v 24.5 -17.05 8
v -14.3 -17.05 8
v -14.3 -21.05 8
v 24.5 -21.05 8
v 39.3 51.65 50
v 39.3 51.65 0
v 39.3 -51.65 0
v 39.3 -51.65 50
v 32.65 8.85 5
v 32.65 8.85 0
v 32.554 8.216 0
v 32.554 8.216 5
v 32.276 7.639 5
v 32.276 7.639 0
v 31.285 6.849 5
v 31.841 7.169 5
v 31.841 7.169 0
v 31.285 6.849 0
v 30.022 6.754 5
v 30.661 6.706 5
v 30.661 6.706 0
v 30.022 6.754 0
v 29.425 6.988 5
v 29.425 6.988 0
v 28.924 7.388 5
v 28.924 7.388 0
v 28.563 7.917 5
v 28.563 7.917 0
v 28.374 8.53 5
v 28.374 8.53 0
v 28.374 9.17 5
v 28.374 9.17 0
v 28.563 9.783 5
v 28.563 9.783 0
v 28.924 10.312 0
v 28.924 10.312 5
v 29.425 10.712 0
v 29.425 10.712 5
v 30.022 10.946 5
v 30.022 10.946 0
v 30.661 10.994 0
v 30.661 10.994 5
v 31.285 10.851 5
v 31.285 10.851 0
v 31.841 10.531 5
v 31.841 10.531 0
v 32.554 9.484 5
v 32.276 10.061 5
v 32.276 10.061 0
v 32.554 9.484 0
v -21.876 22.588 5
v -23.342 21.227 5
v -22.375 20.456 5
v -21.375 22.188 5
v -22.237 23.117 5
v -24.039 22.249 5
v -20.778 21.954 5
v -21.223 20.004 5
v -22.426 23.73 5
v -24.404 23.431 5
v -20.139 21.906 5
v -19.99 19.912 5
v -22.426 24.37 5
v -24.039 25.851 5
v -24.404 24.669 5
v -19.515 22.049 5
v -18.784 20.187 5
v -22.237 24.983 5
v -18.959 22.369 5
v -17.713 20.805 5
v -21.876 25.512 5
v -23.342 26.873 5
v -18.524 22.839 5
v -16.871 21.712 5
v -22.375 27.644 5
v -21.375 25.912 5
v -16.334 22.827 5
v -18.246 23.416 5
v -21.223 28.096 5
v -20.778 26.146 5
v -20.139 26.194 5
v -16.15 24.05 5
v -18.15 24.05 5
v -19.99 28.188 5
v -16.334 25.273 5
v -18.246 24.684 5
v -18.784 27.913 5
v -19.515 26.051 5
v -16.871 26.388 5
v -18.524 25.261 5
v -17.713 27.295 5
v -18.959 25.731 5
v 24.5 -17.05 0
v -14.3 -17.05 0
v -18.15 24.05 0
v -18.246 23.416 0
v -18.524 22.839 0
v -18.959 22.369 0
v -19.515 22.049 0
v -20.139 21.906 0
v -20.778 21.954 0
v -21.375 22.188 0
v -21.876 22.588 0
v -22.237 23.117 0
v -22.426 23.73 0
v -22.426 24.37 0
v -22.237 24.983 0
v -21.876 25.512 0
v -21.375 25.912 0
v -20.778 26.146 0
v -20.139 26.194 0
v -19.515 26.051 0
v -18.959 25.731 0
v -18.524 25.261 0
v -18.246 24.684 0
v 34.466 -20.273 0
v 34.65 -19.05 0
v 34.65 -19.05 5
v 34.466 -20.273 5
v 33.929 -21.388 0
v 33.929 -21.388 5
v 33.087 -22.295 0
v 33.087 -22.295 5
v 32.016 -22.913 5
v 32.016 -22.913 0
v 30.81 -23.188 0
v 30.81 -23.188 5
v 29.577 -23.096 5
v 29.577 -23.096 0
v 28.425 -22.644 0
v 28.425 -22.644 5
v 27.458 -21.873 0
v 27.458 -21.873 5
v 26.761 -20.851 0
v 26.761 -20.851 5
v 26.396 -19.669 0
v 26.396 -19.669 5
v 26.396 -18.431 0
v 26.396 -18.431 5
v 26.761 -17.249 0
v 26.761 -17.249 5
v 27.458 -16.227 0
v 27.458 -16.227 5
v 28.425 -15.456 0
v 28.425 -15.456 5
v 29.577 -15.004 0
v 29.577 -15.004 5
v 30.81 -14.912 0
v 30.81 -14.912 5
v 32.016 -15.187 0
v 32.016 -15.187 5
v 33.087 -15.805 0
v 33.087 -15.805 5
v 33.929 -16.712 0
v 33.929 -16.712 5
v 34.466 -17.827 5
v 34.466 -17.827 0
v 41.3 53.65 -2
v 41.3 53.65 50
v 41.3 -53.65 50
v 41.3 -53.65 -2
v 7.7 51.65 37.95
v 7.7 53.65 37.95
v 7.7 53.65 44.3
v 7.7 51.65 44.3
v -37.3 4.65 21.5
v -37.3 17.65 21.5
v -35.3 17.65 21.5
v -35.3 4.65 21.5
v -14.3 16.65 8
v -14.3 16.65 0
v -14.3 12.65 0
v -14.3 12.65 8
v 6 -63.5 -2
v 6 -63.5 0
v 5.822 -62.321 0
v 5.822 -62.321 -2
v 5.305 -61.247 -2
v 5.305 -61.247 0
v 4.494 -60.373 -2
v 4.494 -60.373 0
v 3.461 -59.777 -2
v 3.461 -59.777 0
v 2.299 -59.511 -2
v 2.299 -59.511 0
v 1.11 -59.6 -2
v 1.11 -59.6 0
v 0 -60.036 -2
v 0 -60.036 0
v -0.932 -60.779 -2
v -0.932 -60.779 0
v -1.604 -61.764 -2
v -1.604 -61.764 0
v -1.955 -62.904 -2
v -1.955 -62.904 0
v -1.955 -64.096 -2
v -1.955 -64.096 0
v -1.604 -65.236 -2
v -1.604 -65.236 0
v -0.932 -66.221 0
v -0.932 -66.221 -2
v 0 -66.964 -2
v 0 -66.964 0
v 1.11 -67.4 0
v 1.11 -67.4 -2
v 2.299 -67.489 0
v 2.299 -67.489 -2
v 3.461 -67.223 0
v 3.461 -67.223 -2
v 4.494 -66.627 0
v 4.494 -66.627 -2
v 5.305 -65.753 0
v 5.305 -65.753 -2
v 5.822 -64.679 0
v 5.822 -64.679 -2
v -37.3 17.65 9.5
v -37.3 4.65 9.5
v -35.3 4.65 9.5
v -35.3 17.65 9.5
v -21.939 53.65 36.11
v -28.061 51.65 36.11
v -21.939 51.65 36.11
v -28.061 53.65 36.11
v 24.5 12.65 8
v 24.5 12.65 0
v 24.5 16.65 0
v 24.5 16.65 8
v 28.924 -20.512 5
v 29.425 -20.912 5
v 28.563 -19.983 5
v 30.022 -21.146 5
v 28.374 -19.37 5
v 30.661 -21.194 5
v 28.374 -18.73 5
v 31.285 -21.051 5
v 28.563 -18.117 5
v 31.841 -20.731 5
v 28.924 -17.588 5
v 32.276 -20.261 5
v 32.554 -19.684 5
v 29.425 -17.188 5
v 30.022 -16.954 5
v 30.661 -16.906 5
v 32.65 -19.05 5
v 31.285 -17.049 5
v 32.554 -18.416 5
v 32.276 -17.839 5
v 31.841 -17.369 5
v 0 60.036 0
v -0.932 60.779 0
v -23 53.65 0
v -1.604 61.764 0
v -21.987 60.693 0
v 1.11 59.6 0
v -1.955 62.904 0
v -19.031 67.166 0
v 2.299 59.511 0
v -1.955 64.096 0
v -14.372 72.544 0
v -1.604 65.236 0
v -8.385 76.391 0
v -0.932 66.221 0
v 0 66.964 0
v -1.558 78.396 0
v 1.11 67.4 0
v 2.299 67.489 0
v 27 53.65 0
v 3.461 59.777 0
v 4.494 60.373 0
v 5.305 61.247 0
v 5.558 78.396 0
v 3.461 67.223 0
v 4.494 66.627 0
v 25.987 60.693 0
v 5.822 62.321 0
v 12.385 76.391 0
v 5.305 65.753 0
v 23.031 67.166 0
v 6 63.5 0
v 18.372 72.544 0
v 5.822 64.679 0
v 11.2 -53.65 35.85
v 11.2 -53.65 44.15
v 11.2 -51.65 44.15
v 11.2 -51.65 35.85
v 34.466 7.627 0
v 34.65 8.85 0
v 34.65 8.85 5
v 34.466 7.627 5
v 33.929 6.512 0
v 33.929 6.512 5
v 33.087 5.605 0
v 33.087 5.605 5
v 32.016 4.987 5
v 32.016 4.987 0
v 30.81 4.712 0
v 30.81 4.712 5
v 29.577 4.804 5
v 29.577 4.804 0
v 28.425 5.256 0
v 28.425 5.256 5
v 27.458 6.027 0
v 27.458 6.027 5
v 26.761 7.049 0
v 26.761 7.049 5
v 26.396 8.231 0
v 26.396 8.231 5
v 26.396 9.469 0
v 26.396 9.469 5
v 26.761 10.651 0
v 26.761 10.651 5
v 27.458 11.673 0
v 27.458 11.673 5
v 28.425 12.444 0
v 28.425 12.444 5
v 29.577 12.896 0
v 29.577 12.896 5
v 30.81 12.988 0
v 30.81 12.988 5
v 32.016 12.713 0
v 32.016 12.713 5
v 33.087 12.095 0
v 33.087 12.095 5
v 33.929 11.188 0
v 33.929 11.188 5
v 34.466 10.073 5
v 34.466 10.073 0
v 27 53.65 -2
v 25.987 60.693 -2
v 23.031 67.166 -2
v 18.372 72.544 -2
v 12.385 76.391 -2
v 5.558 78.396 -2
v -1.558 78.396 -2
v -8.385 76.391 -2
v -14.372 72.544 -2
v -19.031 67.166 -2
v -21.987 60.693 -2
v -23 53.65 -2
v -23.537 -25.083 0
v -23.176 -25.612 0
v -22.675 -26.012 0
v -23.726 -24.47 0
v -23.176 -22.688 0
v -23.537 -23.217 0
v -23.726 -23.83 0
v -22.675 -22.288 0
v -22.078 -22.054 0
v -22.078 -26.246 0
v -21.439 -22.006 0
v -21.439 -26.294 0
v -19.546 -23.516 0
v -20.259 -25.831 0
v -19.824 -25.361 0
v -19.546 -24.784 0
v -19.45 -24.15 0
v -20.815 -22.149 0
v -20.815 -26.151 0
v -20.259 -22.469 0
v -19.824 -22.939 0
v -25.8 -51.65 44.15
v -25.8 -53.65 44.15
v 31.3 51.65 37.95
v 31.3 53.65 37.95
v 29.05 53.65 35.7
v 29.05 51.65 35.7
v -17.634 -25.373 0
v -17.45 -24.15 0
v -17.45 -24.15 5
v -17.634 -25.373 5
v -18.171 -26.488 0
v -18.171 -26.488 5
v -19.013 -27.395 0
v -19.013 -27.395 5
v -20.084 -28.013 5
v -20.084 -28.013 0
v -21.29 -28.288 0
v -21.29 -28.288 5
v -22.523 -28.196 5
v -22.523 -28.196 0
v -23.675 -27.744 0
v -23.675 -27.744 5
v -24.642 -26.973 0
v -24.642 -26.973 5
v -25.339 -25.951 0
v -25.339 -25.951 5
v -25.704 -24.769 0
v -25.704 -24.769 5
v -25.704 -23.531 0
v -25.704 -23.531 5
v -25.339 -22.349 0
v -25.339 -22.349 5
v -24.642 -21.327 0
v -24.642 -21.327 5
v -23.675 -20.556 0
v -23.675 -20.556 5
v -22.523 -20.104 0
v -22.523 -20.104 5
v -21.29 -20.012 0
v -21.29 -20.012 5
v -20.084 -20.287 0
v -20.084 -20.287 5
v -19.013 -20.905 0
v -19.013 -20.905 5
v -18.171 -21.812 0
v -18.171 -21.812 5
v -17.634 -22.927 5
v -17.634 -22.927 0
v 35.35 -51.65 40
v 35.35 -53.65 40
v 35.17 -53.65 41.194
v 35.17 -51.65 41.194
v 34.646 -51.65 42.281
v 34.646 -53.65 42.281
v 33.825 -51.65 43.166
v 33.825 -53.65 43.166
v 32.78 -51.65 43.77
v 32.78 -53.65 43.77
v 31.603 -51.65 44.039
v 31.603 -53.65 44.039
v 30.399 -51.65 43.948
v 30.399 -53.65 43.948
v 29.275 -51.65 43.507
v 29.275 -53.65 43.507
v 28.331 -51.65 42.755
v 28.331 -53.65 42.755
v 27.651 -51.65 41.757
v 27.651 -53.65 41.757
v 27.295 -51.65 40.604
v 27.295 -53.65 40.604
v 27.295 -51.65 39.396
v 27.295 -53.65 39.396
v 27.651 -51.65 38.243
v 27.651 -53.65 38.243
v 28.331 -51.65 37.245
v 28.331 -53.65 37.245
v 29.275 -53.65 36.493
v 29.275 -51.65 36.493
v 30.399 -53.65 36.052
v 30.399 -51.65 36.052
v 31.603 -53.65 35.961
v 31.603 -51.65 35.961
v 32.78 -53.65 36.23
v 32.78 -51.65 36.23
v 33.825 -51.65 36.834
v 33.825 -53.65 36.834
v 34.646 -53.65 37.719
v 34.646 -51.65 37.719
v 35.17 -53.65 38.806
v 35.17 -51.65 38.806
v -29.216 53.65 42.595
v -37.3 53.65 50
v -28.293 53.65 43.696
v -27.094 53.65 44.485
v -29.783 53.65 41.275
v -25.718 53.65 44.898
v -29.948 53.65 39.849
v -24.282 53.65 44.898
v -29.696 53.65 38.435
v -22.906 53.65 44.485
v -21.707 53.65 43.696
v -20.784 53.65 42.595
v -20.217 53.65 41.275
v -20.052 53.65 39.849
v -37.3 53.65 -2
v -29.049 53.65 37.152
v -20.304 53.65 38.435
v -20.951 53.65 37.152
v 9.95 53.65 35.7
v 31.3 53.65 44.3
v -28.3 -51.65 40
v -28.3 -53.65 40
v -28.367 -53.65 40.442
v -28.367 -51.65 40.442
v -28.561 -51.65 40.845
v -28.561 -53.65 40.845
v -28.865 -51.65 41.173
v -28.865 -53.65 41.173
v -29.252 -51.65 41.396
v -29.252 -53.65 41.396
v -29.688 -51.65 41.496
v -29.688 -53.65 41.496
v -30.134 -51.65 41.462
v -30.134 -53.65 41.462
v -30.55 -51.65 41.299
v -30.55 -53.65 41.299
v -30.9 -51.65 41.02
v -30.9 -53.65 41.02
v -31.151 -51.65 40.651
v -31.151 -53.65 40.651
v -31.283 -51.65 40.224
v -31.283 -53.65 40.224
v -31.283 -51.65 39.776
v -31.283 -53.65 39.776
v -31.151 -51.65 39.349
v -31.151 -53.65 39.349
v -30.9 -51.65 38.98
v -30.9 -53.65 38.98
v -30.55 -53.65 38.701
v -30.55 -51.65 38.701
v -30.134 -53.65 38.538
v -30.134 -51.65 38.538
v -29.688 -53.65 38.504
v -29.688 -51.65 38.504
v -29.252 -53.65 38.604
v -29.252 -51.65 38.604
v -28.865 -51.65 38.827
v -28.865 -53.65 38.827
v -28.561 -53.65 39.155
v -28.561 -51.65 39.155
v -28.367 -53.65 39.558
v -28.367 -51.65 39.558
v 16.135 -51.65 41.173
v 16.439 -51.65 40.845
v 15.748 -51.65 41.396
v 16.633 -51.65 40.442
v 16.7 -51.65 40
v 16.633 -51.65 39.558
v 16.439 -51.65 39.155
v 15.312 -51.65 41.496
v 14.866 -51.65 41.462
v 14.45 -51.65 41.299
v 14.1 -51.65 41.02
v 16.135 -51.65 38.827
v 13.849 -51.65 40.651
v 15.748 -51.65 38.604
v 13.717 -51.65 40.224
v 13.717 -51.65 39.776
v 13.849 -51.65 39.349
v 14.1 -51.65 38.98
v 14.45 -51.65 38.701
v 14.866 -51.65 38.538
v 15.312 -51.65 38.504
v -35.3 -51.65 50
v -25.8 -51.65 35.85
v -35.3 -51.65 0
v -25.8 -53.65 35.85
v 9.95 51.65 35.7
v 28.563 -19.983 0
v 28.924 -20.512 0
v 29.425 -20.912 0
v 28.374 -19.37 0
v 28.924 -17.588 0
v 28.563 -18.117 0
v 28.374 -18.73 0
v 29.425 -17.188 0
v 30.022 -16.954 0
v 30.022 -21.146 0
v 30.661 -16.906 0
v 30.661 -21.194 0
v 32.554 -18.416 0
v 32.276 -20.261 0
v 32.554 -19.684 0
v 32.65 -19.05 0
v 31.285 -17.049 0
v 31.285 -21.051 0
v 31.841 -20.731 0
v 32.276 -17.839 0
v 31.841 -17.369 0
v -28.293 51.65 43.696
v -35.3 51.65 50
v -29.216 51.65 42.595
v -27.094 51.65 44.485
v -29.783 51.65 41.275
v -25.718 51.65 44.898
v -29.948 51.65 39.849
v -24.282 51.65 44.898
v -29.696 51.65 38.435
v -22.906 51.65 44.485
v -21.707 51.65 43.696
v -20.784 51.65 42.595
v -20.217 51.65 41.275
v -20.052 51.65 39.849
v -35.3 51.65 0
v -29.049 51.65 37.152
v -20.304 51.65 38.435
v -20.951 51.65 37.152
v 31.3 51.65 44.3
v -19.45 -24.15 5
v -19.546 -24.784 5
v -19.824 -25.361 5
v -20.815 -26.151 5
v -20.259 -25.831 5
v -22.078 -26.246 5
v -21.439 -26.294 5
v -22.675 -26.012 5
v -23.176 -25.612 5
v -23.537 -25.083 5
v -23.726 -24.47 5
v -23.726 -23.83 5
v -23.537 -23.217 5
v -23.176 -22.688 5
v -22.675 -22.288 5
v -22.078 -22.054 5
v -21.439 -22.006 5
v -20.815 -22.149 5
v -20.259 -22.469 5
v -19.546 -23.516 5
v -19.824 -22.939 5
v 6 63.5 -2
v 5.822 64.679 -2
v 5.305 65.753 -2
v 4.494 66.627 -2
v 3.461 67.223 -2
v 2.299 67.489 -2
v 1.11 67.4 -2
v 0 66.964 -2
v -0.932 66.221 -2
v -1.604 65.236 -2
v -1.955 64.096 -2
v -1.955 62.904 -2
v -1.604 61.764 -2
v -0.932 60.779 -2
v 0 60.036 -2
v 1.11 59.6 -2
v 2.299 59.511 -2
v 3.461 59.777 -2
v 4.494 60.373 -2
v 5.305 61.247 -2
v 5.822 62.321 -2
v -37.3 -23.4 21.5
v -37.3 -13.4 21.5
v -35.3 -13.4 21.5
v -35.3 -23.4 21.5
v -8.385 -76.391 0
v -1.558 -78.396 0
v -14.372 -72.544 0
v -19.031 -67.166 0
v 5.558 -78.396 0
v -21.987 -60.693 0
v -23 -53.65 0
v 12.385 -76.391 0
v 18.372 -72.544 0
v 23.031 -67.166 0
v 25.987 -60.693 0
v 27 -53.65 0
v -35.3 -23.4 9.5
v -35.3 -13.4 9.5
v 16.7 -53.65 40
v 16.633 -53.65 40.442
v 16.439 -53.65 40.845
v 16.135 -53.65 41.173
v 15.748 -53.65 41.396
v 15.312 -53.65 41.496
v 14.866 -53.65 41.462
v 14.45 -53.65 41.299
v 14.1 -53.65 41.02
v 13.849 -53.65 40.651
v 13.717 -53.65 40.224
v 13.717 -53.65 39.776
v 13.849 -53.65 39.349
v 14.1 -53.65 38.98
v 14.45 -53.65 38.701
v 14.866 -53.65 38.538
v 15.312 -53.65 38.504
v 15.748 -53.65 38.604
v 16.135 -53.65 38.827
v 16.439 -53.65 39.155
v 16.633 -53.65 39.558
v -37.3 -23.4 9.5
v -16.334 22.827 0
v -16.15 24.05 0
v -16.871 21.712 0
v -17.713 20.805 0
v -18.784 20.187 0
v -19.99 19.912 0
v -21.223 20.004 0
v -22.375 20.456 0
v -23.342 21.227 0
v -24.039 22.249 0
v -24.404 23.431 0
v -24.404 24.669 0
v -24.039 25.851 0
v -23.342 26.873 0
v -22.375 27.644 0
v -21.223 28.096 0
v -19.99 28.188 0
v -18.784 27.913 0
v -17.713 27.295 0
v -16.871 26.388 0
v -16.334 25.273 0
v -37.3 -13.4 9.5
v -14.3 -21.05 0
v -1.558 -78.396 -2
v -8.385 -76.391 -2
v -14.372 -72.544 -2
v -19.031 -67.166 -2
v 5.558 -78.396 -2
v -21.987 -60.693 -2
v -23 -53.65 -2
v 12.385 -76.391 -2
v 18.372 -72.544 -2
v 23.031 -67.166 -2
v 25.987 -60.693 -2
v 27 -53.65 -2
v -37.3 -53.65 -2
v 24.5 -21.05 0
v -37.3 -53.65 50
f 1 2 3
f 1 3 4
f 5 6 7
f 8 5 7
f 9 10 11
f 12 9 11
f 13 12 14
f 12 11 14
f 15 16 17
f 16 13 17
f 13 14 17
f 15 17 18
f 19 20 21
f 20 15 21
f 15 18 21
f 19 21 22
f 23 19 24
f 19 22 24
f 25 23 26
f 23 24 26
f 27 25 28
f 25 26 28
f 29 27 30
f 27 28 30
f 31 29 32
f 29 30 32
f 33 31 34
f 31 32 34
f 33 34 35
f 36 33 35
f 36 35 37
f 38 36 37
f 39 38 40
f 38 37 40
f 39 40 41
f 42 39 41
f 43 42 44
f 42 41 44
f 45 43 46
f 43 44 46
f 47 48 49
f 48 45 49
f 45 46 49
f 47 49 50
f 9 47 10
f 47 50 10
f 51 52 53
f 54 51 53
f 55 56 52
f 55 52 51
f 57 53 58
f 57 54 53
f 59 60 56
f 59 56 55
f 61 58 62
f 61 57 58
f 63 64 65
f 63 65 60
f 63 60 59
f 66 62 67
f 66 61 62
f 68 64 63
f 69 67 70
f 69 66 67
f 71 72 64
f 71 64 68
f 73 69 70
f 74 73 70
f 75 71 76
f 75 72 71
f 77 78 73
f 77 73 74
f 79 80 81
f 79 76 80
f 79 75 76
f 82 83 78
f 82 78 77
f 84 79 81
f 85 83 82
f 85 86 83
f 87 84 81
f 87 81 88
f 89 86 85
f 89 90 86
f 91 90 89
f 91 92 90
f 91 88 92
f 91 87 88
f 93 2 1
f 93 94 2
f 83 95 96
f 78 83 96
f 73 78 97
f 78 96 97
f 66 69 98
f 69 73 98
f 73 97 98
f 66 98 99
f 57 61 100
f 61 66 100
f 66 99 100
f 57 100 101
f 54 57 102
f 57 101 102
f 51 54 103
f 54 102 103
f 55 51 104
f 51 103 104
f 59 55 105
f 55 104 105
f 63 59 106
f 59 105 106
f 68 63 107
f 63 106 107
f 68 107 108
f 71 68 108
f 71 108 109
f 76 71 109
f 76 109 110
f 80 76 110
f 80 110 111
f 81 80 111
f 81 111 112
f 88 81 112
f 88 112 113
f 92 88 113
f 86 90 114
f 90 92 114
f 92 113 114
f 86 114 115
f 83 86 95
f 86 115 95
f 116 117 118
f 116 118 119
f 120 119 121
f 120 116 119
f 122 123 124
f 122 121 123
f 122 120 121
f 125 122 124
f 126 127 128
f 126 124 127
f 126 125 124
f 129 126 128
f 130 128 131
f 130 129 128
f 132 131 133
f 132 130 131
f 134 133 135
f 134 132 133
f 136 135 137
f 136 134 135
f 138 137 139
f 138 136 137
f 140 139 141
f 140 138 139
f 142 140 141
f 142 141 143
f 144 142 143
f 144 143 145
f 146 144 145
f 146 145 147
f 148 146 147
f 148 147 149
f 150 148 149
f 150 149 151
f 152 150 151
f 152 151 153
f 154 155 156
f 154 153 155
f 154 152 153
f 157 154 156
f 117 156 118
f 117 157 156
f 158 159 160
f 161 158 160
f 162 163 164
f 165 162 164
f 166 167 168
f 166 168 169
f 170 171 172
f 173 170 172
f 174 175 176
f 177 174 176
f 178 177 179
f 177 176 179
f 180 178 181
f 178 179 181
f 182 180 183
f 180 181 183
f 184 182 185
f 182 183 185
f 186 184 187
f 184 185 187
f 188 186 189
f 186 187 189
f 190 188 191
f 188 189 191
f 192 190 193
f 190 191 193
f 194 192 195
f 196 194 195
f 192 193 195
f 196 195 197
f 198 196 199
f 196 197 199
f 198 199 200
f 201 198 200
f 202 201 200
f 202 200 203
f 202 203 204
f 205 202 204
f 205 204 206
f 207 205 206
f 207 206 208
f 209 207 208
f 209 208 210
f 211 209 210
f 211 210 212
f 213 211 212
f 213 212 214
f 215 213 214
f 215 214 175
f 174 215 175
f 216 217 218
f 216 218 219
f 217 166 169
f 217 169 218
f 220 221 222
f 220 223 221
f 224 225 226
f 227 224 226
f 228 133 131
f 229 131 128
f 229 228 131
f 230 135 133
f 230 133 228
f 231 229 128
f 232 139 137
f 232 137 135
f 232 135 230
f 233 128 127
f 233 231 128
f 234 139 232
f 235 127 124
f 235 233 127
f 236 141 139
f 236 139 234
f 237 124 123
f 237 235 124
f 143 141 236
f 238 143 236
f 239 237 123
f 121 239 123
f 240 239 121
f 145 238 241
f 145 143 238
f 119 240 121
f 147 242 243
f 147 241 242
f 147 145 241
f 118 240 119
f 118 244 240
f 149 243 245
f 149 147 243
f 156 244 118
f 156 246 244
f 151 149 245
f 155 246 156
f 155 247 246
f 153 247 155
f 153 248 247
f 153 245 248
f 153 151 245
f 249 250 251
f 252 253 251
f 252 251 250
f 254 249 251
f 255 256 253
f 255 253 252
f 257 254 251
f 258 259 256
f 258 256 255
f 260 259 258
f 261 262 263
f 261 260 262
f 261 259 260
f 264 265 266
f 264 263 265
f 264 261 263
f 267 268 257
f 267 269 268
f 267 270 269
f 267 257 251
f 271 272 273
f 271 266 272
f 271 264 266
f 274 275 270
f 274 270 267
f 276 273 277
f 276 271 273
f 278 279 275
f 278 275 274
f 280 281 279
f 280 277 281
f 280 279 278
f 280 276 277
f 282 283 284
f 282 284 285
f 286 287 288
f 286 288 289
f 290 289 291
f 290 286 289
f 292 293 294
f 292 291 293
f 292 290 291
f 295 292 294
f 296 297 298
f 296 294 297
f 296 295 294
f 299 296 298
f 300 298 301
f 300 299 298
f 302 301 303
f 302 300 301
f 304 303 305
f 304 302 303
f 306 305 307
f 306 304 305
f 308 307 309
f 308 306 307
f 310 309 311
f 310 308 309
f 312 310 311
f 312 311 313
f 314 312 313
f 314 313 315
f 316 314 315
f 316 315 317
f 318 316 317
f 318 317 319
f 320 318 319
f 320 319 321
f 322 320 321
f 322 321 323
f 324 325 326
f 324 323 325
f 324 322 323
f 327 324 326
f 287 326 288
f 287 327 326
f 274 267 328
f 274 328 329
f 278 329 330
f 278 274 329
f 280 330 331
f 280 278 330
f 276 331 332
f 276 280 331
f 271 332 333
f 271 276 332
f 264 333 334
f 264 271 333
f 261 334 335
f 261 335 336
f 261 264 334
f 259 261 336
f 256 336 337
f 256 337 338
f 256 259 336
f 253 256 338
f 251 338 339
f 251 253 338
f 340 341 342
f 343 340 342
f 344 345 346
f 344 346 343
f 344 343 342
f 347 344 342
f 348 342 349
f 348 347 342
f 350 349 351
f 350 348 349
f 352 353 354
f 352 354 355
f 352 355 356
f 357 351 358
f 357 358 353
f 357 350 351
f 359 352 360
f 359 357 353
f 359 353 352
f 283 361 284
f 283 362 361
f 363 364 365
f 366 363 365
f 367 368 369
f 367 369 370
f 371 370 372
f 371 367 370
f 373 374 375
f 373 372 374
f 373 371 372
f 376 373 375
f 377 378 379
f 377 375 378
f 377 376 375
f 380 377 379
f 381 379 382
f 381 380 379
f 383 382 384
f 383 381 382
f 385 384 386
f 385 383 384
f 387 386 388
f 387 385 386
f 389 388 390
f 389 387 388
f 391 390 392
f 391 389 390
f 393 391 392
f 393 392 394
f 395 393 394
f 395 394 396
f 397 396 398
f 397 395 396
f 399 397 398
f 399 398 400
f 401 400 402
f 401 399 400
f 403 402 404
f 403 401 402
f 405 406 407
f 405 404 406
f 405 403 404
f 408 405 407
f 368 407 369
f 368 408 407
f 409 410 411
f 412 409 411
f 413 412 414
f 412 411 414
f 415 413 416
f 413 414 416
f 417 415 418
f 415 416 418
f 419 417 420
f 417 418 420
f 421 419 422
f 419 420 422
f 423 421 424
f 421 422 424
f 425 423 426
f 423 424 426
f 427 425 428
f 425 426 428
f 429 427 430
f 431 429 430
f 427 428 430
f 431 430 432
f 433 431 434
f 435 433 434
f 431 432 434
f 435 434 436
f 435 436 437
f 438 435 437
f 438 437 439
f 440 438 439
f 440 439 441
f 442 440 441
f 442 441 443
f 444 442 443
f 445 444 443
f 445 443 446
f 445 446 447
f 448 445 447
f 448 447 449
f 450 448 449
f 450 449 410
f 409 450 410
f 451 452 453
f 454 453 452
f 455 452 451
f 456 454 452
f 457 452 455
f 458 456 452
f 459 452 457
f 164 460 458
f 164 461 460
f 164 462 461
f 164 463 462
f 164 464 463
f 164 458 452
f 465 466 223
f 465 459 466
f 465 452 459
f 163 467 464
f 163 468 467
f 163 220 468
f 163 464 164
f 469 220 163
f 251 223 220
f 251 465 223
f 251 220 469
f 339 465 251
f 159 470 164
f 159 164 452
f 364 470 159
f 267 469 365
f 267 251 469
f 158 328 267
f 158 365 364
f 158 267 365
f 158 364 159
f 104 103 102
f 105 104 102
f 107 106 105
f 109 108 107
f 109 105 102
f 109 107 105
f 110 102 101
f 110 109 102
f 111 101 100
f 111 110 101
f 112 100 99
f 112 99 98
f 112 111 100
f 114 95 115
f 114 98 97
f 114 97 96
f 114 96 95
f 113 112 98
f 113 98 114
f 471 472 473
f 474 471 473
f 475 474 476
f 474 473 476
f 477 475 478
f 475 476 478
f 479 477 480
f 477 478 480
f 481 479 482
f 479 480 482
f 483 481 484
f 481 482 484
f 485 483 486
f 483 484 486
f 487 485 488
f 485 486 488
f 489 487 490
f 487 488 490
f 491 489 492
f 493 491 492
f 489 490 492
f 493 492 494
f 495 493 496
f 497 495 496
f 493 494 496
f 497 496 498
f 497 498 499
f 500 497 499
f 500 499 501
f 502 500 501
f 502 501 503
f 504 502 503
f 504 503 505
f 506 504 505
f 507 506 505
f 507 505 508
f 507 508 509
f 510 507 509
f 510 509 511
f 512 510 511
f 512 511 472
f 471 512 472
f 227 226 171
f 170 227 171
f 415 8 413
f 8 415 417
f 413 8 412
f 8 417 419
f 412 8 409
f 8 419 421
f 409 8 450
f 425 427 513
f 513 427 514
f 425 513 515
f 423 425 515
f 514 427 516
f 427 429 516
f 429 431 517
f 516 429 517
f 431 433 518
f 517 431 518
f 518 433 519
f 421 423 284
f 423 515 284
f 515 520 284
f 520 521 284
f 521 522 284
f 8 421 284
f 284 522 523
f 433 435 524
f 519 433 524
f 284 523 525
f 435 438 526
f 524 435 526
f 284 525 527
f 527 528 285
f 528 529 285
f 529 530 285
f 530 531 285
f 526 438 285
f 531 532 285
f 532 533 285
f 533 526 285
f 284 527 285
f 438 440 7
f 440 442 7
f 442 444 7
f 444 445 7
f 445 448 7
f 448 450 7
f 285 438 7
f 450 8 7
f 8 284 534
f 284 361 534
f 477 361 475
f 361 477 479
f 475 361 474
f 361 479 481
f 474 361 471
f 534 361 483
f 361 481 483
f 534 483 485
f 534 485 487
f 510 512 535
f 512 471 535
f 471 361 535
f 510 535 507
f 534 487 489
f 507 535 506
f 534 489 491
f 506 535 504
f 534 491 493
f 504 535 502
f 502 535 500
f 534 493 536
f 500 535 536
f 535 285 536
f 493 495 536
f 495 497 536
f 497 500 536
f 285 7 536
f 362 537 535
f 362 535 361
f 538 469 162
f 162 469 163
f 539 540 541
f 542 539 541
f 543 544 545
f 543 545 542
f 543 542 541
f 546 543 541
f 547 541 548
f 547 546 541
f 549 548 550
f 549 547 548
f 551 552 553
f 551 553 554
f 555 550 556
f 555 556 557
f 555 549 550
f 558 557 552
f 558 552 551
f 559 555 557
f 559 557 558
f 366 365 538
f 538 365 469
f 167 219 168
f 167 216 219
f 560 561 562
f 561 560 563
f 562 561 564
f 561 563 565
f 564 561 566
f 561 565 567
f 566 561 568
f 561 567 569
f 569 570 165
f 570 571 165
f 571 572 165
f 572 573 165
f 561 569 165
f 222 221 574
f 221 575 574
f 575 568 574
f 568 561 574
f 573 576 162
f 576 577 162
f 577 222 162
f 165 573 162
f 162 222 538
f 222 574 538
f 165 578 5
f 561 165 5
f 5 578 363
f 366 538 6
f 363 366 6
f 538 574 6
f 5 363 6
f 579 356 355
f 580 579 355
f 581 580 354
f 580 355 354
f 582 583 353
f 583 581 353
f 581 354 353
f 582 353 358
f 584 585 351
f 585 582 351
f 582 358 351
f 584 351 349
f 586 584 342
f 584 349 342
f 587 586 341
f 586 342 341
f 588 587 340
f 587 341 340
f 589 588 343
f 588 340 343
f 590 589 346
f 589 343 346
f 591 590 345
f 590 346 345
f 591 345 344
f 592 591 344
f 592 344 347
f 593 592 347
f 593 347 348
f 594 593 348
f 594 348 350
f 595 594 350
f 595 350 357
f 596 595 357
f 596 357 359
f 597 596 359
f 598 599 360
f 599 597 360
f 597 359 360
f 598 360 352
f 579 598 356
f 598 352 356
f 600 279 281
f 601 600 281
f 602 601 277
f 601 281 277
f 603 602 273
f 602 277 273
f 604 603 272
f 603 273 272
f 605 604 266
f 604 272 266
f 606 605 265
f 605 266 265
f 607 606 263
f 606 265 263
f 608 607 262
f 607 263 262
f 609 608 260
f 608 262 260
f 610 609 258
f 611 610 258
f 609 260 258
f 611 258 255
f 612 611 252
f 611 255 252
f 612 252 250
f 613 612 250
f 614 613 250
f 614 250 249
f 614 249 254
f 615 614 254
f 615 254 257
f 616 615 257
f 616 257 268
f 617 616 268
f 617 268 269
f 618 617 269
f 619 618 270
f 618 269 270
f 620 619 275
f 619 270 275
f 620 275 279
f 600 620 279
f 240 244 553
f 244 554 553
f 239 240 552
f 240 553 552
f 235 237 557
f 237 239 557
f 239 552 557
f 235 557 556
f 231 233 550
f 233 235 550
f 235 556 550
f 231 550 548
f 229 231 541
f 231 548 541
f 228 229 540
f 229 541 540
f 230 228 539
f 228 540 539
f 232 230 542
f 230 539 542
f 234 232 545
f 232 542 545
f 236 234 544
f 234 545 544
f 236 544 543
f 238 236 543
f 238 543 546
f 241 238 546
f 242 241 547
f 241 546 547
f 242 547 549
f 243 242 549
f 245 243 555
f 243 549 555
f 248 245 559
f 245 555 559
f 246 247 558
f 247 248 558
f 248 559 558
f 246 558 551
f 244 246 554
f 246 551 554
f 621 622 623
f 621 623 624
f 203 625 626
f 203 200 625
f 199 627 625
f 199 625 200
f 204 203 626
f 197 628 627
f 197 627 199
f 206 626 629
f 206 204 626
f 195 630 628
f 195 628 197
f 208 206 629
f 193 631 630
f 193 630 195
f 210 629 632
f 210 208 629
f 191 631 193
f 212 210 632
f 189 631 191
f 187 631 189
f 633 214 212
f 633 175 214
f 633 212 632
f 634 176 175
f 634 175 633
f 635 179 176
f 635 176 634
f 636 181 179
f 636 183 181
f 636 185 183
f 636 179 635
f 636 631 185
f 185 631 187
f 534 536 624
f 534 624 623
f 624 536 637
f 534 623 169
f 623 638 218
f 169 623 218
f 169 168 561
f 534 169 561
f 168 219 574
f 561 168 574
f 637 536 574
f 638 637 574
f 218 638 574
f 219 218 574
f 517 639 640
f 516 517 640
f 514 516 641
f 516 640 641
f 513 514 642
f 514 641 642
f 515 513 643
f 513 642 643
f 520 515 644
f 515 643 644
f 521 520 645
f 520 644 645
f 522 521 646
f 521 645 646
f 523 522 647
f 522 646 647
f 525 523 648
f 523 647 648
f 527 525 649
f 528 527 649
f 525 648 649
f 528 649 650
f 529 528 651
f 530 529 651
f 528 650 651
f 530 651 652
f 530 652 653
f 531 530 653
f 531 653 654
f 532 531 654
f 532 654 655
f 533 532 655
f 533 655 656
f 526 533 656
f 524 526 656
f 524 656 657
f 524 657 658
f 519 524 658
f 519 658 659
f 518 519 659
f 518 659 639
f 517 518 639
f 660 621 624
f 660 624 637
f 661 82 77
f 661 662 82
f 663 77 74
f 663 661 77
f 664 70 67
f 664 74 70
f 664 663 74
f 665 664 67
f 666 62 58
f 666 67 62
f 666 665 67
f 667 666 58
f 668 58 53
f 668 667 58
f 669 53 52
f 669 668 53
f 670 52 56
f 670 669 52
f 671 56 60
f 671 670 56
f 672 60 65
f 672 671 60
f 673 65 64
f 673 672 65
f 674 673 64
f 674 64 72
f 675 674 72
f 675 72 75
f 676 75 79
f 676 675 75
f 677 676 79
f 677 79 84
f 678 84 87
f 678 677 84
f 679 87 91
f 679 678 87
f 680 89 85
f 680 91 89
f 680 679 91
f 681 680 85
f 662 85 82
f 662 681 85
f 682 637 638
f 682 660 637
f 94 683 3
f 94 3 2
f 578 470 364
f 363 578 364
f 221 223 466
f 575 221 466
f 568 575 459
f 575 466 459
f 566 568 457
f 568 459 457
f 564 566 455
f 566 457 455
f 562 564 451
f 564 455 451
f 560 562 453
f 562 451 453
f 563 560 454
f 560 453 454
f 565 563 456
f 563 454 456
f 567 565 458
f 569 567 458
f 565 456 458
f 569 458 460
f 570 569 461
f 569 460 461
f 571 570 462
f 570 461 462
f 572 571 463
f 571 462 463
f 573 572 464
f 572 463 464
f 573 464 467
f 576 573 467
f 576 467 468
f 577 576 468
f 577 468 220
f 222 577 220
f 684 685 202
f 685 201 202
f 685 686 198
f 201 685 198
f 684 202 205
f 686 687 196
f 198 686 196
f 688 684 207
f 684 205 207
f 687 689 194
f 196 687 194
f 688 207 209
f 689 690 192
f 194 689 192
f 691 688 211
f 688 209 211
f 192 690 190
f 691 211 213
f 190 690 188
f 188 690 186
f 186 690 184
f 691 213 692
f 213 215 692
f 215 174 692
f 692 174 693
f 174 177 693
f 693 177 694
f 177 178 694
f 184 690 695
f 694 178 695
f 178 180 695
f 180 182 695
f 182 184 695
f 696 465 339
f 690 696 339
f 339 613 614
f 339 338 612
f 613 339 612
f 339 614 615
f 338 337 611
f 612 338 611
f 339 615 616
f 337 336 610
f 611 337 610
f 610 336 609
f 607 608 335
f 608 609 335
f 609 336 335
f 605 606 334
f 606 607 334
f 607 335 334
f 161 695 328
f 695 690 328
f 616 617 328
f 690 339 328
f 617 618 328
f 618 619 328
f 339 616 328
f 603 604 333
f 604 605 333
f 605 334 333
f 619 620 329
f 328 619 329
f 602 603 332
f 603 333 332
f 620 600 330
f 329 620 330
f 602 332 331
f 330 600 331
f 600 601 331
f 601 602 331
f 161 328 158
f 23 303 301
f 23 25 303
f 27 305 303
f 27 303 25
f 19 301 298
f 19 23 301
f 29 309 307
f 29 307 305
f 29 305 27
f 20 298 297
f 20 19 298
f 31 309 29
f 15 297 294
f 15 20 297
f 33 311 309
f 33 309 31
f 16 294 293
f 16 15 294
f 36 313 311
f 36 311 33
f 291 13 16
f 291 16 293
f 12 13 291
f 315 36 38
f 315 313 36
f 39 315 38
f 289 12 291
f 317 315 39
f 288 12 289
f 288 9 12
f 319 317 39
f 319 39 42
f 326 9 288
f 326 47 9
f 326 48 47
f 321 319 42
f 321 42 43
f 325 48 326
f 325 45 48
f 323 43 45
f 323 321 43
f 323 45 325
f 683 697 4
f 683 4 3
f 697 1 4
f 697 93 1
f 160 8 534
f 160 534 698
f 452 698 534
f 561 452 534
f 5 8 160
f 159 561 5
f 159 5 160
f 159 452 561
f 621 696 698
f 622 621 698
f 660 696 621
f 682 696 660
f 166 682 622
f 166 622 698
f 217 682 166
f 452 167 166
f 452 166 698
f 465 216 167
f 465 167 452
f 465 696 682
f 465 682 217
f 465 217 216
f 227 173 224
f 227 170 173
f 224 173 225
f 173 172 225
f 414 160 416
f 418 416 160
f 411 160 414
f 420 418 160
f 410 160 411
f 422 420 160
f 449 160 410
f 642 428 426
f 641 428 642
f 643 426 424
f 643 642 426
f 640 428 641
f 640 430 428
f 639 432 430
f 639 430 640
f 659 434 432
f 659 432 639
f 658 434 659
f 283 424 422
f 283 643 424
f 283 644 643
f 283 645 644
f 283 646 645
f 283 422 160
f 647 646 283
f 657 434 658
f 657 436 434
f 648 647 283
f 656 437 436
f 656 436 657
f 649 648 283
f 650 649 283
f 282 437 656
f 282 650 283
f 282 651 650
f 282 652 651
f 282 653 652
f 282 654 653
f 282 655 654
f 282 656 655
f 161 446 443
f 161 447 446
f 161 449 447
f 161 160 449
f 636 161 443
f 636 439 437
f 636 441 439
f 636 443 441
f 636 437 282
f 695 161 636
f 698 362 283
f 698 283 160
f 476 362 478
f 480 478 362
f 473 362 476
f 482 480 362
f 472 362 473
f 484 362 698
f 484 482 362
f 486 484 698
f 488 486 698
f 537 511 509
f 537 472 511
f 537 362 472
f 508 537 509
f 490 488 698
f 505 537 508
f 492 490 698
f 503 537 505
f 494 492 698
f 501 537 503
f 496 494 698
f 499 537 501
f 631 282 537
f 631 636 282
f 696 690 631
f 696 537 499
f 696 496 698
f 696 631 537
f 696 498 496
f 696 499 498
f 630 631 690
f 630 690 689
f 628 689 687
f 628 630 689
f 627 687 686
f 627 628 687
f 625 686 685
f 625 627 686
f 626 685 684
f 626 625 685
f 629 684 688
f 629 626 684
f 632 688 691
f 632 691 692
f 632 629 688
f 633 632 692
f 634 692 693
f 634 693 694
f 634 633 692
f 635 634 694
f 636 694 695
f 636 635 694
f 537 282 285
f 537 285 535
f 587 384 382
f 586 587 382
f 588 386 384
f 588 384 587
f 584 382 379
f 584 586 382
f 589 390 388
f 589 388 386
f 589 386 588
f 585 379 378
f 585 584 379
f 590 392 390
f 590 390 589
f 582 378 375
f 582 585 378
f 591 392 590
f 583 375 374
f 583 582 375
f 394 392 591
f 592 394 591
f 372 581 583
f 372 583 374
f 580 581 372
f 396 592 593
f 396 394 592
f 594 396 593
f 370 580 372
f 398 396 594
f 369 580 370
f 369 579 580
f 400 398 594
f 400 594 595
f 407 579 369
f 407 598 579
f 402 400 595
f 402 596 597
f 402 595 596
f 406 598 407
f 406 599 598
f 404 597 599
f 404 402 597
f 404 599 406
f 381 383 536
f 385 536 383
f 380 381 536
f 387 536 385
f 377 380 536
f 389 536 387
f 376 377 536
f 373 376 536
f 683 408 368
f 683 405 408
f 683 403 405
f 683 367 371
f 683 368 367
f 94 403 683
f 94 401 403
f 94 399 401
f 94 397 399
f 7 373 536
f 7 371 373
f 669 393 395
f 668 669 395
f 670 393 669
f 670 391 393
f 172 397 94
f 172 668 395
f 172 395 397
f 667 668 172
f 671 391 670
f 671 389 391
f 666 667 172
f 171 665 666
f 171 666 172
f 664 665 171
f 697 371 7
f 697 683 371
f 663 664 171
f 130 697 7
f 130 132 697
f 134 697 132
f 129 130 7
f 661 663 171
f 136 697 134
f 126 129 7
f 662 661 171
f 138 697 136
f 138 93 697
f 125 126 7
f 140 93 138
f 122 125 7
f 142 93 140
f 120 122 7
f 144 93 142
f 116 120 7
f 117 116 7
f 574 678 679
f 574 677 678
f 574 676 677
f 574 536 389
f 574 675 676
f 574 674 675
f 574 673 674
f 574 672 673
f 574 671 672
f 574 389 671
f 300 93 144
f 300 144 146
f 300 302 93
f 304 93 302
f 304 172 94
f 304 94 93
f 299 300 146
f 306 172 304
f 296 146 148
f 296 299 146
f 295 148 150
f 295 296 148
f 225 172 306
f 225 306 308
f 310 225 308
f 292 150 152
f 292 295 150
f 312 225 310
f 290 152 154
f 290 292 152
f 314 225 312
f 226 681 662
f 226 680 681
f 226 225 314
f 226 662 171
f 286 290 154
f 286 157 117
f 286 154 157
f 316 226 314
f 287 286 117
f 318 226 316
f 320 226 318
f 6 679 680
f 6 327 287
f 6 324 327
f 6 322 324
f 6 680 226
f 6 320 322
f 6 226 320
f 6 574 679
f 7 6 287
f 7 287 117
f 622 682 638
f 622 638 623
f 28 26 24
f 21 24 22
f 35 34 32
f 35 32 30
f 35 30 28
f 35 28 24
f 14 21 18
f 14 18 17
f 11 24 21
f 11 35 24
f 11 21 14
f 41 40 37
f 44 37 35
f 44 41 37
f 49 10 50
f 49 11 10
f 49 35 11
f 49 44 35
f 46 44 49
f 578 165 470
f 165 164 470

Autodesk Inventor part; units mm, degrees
ref_plane "YZ Plane" through (0, 0, 0) normal (1, 0, 0) x (0, 1, 0)
ref_plane "XZ Plane" through (0, 0, 0) normal (0, 1, 0) x (-1, 0, 0)
ref_plane "XY Plane" through (0, 0, 0) normal (0, 0, 1) x (1, 0, 0)
sketch "Sketch1" plane through (0, 0, 0) normal (0, 0, 1) x (1, 0, 0)
  line L0 (-35.3, 51.65) -> (39.3, 51.65)
  line L1 (39.3, 51.65) -> (39.3, -51.65)
  line L2 (39.3, -51.65) -> (-35.3, -51.65)
  line L3 (-35.3, -51.65) -> (-35.3, 51.65)
  line L4 (-35.3, 51.65) -> (39.3, -51.65) construction
  line L5 (39.3, 51.65) -> (-35.3, -51.65) construction
  line L6 (34.3, 26.65) -> (-34.3, 26.65) construction
  line L7 (-34.3, 26.65) -> (-34.3, -26.65) construction
  line L8 (-34.3, -26.65) -> (34.3, -26.65) construction
  line L9 (34.3, -26.65) -> (34.3, 26.65) construction
  line L10 (34.3, 26.65) -> (-34.3, -26.65) construction
  line L11 (-34.3, 26.65) -> (34.3, -26.65) construction
  circle A0 centre (-20.3, 24.05) radius 1.6 construction
  circle A1 centre (-21.6, -24.15) radius 1.6 construction
  circle A2 centre (30.5, 8.85) radius 1.6 construction
  circle A3 centre (30.5, -19.05) radius 1.6 construction
  line L12 (-37.3, 53.65) -> (41.3, 53.65)
  line L13 (41.3, 53.65) -> (41.3, -53.65)
  line L14 (41.3, -53.65) -> (-37.3, -53.65)
  line L15 (-37.3, -53.65) -> (-37.3, 53.65)
  line L16 (-37.3, 53.65) -> (41.3, -53.65) construction
  line L17 (41.3, 53.65) -> (-37.3, -53.65) construction
  line L18 (30.5, 53.65) -> (30.5, -53.65) construction
  arc A4 (27, 53.65) -> (-23, 53.65) centre (2, 53.65) ccw
  arc A5 (-23, -53.65) -> (27, -53.65) centre (2, -53.65) ccw
  circle A6 centre (2, 63.5) radius 4
  circle A7 centre (2, -63.5) radius 4
  line L19 (2, -63.5) -> (2, 63.5) construction
  line L20 (2, 78.65) -> (2, 63.5) construction
  line L21 (2, -63.5) -> (2, -78.65) construction
  point P0 (0, 0)
  dimension "d0" = 53.3
  dimension "d2" = 68.6
  dimension "d3" = 14
  dimension "d4" = 2.5
  dimension "d5" = 50.8
  dimension "d6" = 27.9
  dimension "d7" = 5.1
  dimension "d8" = 3.2
  dimension "d9" = 25
  dimension "d10" = 1
  dimension "d11" = 2
  dimension "d12" = 2
  dimension "d59" = 5
  dimension "d62" = 25
  dimension "d63" = 2
  dimension "d64" = 2
  dimension "d92" = 15.2
  dimension "d94" = 1.3
  dimension "d95" = 50
  dimension "d96" = 8
  dimension "d99" = 127
extrude "Extrusion1" add sketch "Sketch1" against normal blind 2 contours L0 L1 L2 L3 | L12 L13 L14 L15
extrude "Extrusion2" add sketch "Sketch1" along normal blind 50 contours L12 L13 L14 L15
sketch "Sketch2" plane through (0, 0, 0) normal (0, 0, 1) x (1, 0, 0)
  circle A0 centre (-21.6, -24.15) radius 1.6 construction
  circle A1 centre (-20.3, 24.05) radius 4.15
  circle A2 centre (-21.6, -24.15) radius 4.15
  circle A3 centre (30.5, -19.05) radius 4.15
  circle A4 centre (30.5, 8.85) radius 4.15
  circle A5 centre (-20.3, 24.05) radius 2.15
  circle A6 centre (30.5, 8.85) radius 2.15
  circle A7 centre (-21.6, -24.15) radius 2.15
  circle A8 centre (30.5, -19.05) radius 2.15
  point P0 (0, 0)
  dimension "d17" = 8.3
  dimension "d19" = 4.3
extrude "Extrusion3" add sketch "Sketch2" along normal blind 5
sketch "Sketch6" plane through (-37.3, 53.65, -2) normal (0, 1, 0) x (1, 0, 0)
  line L0 (78.6, -52) -> (78.6, 0) projected
  line L1 (0, 0) -> (0, -52) projected
  line L2 (0, -42) -> (78.6, -42) construction
  arc A0 (9.2389, -38.11) -> (15.3611, -38.11) centre (12.3, -42) ccw
  line L3 (78.6, -52) -> (0, -52) projected
  line L4 (12.3, -42) -> (12.3, -38.11) construction
  line L5 (9.2389, -38.11) -> (15.3611, -38.11)
  line L6 (68.6, -46.3) -> (68.6, -39.95)
  line L7 (66.35, -37.7) -> (47.25, -37.7)
  line L8 (45, -39.95) -> (45, -46.3)
  line L9 (45, -46.3) -> (68.6, -46.3)
  line L10 (47.25, -37.7) -> (45, -39.95)
  line L11 (68.6, -39.95) -> (66.35, -37.7)
  line L12 (68.6, -46.3) -> (68.6, -41.3) construction
  line L13 (56.8, -37.7) -> (56.8, -46.3) construction
  point P0 (37.3, -2)
  point P1 (45, -37.7)
  point P2 (68.6, -37.7)
  point P3 (56.8, -42)
  dimension "d46" = 9.9
  dimension "d54" = 12.3
  dimension "d65" = 3.89
  dimension "d122" = 23.6
  dimension "d123" = 8.6
  dimension "d124" = 2.25
  dimension "d125" = 2.25
  dimension "d126" = 2.25
  dimension "d127" = 2.25
  dimension "d128" = 5
  dimension "d129" = 10
  dimension "d130" = 10
extrude "Extrusion6" cut sketch "Sketch6" against normal up to next
sketch "Sketch7" plane through (0, 0, 0) normal (0, 0, 1) x (1, 0, 0)
  circle A0 centre (30.5, -19.05) radius 4.15 projected
  circle A1 centre (30.5, 8.85) radius 4.15 projected
  line L0 (-14.3, -17.05) -> (24.5, -17.05)
  line L1 (24.5, -17.05) -> (24.5, -21.05)
  line L2 (24.5, -21.05) -> (-14.3, -21.05)
  line L3 (-14.3, -21.05) -> (-14.3, -17.05)
  line L4 (-34.3, -26.65) -> (34.3, -26.65) construction
  line L5 (34.3, 26.65) -> (-34.3, 26.65) construction
  line L6 (34.3, -26.65) -> (34.3, 26.65) construction
  line L7 (-34.3, 26.65) -> (-34.3, -26.65) construction
  line L8 (24.5, 16.65) -> (-14.3, 16.65)
  line L9 (-14.3, 16.65) -> (-14.3, 12.65)
  line L10 (-14.3, 12.65) -> (24.5, 12.65)
  line L11 (24.5, 12.65) -> (24.5, 16.65)
  point P0 (0, 0)
  point P1 (24.5, -19.05)
  dimension "d79" = 4
  dimension "d80" = 20
  dimension "d81" = 6
  dimension "d82" = 6
  dimension "d83" = 20
  dimension "d86" = 10
  dimension "d87" = 0
extrude "Extrusion7" add sketch "Sketch7" along normal blind 8 contours L0 L1 L2 L3 | L11 L10 L9 L8
sketch "Sketch4" plane through (-37.3, -53.65, -2) normal (-1, 0, 0) x (0, 0, 1)
  line L0 (11.5, 71.3) -> (23.5, 71.3)
  line L1 (23.5, 71.3) -> (23.5, 58.3)
  line L2 (23.5, 58.3) -> (11.5, 58.3)
  line L3 (11.5, 58.3) -> (11.5, 71.3)
  line L4 (11.5, 71.3) -> (23.5, 58.3) construction
  line L5 (23.5, 71.3) -> (11.5, 58.3) construction
  line L6 (23.5, 30.25) -> (11.5, 30.25)
  line L7 (11.5, 30.25) -> (11.5, 40.25)
  line L8 (11.5, 40.25) -> (23.5, 40.25)
  line L9 (23.5, 40.25) -> (23.5, 30.25)
  line L10 (23.5, 30.25) -> (11.5, 40.25) construction
  line L11 (11.5, 30.25) -> (23.5, 40.25) construction
  line L12 (2, 0) -> (2, 107.3) projected
  line L13 (7, 73.55) -> (7, 81.85) projected
  line L14 (10, 36.6) -> (10, 32.6) projected
  line L15 (0, 107.3) -> (52, 107.3) projected
  line L16 (0, 0) -> (0, 107.3) projected
  line L17 (52, 0) -> (0, 0) projected
  line L18 (52, 107.3) -> (52, 0) projected
  point P0 (2, 53.65)
  point P1 (2, 80.3)
  point P2 (2, 80.3)
  point P3 (2, 80.3)
  point P4 (2, 27)
  point P5 (2, 27)
  point P6 (2, 27)
  point P7 (17.5, 64.8)
  point P8 (17.5, 35.25)
  point P9 (2, 0)
  dimension "d22" = 13
  dimension "d24" = 12
  dimension "d26" = 9
  dimension "d27" = 12
  dimension "d28" = 10
  dimension "d31" = 3.25
  dimension "d88" = 1.5
  dimension "d90" = 1.5
extrude "Extrusion4" cut sketch "Sketch4" against normal up to surface (2 mm away) contours L0 L1 L2 L3 | L6 L7 L8 L9
extrude "Extrusion8" add sketch "Sketch1" against normal up to surface (2 mm away) contours A4 L12 | L14 A5
sketch "Sketch8" plane through (-37.3, -53.65, 50) normal (0, -1, 0) x (1, 0, 0)
  line L0 (78.6, 0) -> (78.6, -52) projected
  line L1 (0, 0) -> (78.6, 0) projected
  line L2 (0, 0) -> (0, -52) projected
  line L3 (11.5, -5.85) -> (48.5, -5.85)
  line L4 (48.5, -5.85) -> (48.5, -14.15)
  line L5 (48.5, -14.15) -> (11.5, -14.15)
  line L6 (11.5, -14.15) -> (11.5, -5.85)
  line L7 (48.5, -10) -> (52.5, -10) construction
  line L8 (11.5, -10) -> (7.5, -10) construction
  circle A0 centre (7.5, -10) radius 1.5
  circle A1 centre (52.5, -10) radius 1.5
  line L9 (0, -10) -> (7.5, -10) construction
  line L10 (7.5, -10) -> (7.5, 0) construction
  circle A2 centre (68.6, -10) radius 4.05
  line L11 (68.6, -10) -> (68.6, 0) construction
  line L12 (68.6, -10) -> (78.6, -10) construction
  point P0 (37.3, -50)
  dimension "d100" = 8.3
  dimension "d102" = 37
  dimension "d103" = 4
  dimension "d104" = 3
  dimension "d105" = 10
  dimension "d106" = 7.5
  dimension "d107" = 8.1
  dimension "d108" = 10
extrude "Extrusion9" cut sketch "Sketch8" against normal up to next
equation "\"d125\" = d124"
equation "\"d126\" = d124"
equation "\"d127\" = d126"
properties part number "LED pump controller"
